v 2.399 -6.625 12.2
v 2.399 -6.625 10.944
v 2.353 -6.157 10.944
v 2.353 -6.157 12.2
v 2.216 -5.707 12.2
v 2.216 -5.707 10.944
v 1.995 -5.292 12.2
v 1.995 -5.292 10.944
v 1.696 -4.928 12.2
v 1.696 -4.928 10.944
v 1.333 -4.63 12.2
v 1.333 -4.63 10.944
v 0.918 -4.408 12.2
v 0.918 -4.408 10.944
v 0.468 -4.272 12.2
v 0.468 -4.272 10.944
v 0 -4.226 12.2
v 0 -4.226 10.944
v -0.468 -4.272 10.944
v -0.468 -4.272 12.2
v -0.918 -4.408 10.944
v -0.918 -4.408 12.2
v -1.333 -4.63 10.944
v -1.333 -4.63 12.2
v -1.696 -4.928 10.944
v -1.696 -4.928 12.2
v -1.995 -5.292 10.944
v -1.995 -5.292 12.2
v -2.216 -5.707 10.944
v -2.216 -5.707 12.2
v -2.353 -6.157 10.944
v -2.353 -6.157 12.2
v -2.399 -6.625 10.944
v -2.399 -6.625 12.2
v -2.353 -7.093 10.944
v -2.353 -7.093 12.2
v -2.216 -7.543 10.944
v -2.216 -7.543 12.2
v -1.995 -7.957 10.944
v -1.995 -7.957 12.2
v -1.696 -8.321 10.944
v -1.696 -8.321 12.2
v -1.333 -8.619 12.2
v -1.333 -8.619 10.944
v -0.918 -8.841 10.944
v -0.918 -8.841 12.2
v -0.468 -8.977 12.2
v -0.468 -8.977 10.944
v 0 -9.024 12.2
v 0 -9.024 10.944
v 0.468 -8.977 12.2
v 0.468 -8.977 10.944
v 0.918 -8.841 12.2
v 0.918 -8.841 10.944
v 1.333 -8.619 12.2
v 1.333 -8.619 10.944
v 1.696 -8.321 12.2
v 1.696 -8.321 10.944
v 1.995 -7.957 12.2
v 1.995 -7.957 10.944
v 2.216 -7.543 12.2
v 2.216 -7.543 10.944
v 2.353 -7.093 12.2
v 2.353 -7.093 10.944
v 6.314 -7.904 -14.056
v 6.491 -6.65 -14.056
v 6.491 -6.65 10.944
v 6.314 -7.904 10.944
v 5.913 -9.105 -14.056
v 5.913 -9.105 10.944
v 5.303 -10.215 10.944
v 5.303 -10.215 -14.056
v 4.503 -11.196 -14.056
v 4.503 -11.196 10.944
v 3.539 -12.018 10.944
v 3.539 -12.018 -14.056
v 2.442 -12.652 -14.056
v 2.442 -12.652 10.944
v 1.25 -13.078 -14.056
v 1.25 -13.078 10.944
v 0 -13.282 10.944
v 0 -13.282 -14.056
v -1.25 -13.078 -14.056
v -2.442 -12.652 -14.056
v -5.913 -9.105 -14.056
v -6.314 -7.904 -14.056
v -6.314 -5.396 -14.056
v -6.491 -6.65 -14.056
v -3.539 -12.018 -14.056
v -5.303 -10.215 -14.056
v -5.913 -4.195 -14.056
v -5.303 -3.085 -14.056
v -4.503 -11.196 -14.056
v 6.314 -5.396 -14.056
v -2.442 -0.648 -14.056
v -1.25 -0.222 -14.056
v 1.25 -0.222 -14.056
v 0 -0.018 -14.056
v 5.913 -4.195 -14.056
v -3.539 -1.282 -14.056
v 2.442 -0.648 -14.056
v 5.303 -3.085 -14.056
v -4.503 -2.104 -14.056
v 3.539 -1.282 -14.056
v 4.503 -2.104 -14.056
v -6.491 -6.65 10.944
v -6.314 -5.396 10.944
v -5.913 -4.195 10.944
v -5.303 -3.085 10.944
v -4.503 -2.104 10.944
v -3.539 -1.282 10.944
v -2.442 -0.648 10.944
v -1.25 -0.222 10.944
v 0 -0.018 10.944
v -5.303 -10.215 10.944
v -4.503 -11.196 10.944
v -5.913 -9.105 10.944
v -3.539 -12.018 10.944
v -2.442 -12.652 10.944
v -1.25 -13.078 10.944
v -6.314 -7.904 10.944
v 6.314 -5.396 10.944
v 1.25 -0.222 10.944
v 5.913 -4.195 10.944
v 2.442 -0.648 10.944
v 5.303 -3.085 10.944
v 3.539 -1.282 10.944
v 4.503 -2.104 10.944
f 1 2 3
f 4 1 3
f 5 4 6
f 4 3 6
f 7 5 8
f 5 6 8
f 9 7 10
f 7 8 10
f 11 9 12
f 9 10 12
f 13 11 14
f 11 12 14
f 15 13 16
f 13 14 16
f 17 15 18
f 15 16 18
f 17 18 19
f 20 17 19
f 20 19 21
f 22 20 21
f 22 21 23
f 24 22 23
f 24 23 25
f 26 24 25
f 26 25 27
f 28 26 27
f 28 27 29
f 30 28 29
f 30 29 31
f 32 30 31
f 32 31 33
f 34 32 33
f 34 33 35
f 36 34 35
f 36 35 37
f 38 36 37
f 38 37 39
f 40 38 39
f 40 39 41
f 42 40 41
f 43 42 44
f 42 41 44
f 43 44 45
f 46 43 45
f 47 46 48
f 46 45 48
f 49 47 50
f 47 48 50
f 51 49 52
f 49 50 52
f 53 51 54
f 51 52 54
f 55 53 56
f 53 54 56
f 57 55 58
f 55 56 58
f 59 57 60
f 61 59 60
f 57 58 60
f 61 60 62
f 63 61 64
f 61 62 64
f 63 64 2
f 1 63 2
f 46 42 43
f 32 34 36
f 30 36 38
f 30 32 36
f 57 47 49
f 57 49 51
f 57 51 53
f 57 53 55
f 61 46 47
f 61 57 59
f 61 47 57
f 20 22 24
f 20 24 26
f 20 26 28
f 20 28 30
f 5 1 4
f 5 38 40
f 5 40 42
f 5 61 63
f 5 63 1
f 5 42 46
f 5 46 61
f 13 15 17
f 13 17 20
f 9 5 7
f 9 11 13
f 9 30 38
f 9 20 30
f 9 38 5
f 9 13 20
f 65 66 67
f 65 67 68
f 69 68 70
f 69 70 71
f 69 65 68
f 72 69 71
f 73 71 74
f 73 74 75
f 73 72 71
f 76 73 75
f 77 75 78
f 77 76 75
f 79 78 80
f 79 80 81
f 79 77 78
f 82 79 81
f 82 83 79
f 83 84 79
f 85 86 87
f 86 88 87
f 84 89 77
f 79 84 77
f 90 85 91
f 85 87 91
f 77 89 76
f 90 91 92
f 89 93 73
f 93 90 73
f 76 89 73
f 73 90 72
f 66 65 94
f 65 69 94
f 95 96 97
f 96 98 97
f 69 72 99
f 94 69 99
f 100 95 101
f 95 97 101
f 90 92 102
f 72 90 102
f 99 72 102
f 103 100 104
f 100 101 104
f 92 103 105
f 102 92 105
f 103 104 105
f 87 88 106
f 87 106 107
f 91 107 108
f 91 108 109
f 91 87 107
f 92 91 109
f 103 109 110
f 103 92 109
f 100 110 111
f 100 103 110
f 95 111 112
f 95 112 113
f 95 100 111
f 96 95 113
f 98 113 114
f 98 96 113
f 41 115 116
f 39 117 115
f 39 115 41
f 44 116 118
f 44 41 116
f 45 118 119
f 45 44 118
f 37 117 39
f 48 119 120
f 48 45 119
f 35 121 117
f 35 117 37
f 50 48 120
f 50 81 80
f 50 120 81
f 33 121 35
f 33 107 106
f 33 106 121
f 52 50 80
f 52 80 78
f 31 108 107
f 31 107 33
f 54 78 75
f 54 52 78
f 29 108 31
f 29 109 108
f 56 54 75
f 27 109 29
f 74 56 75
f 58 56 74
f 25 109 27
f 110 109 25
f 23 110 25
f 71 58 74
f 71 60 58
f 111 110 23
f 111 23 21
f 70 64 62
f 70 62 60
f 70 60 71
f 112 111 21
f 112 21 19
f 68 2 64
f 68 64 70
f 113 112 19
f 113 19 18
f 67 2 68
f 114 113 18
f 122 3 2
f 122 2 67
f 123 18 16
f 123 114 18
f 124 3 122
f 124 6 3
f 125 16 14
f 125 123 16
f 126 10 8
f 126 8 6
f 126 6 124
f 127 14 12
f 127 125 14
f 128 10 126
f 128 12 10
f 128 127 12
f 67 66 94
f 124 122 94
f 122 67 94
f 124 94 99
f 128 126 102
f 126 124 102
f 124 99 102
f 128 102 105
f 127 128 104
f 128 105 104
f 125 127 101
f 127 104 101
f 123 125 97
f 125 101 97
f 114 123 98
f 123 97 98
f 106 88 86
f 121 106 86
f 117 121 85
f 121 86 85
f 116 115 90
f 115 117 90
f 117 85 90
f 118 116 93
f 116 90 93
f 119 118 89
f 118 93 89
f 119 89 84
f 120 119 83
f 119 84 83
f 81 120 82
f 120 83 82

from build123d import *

# Parameters (mm, degrees)
F0_W        = 13
F0_H        = 25
F1_DEPTH    = 13.3
F2_T1_DEPTH = 60
F3_R        = 2.3988819555
F4_DEPTH    = 12.2


# Not quite as in the source:
# - a fillet or chamfer that OpenCascade refuses, or shapes differently, is made with other operations: its cross-section is extruded or revolved along the edge and cut away or added
# - a feature names something its author has since deleted; it is built from what else it names


with BuildPart() as f1:
    # F0 (on Front) → F1 (new body)
    with BuildSketch(Plane.XZ):
        with Locations((0, -1.5561378314)):
            Rectangle(F0_W, F0_H)
    extrude(amount=F1_DEPTH)

    # F2: fillet of radius 7 on 4 edges, made by hand

    # F2_s2 → F2_t1 (cut)
    with BuildSketch(Plane.XY.offset(-31.5561378314)):
        with BuildLine():
            ThreePointArc((6.5, -6.3), (4.4497474683, -11.2497474683), (-0.5, -13.3))
            Line((-0.5, -13.3), (6.5, -13.3))
            Line((6.5, -13.3), (6.5, -6.3))
        make_face()
        with BuildLine():
            ThreePointArc((6.5, -7), (4.4497474683, -2.0502525317), (-0.5, 0))
            Line((-0.5, 0), (6.5, 0))
            Line((6.5, 0), (6.5, -7))
        make_face()
        with BuildLine():
            ThreePointArc((-6.5, -7), (-4.4497474683, -2.0502525317), (0.5, 0))
            Line((0.5, 0), (-6.5, 0))
            Line((-6.5, 0), (-6.5, -7))
        make_face()
        with BuildLine():
            ThreePointArc((-6.5, -6.3), (-4.4497474683, -11.2497474683), (0.5, -13.3))
            Line((0.5, -13.3), (-6.5, -13.3))
            Line((-6.5, -13.3), (-6.5, -6.3))
        make_face()
    extrude(amount=F2_T1_DEPTH, mode=Mode.SUBTRACT)

    # F3 (on Top) → F4 (join)
    with BuildSketch(Plane.XY):
        with Locations((0, -6.6247042269)):
            Circle(F3_R)
    extrude(amount=F4_DEPTH)


solid = f1.part
